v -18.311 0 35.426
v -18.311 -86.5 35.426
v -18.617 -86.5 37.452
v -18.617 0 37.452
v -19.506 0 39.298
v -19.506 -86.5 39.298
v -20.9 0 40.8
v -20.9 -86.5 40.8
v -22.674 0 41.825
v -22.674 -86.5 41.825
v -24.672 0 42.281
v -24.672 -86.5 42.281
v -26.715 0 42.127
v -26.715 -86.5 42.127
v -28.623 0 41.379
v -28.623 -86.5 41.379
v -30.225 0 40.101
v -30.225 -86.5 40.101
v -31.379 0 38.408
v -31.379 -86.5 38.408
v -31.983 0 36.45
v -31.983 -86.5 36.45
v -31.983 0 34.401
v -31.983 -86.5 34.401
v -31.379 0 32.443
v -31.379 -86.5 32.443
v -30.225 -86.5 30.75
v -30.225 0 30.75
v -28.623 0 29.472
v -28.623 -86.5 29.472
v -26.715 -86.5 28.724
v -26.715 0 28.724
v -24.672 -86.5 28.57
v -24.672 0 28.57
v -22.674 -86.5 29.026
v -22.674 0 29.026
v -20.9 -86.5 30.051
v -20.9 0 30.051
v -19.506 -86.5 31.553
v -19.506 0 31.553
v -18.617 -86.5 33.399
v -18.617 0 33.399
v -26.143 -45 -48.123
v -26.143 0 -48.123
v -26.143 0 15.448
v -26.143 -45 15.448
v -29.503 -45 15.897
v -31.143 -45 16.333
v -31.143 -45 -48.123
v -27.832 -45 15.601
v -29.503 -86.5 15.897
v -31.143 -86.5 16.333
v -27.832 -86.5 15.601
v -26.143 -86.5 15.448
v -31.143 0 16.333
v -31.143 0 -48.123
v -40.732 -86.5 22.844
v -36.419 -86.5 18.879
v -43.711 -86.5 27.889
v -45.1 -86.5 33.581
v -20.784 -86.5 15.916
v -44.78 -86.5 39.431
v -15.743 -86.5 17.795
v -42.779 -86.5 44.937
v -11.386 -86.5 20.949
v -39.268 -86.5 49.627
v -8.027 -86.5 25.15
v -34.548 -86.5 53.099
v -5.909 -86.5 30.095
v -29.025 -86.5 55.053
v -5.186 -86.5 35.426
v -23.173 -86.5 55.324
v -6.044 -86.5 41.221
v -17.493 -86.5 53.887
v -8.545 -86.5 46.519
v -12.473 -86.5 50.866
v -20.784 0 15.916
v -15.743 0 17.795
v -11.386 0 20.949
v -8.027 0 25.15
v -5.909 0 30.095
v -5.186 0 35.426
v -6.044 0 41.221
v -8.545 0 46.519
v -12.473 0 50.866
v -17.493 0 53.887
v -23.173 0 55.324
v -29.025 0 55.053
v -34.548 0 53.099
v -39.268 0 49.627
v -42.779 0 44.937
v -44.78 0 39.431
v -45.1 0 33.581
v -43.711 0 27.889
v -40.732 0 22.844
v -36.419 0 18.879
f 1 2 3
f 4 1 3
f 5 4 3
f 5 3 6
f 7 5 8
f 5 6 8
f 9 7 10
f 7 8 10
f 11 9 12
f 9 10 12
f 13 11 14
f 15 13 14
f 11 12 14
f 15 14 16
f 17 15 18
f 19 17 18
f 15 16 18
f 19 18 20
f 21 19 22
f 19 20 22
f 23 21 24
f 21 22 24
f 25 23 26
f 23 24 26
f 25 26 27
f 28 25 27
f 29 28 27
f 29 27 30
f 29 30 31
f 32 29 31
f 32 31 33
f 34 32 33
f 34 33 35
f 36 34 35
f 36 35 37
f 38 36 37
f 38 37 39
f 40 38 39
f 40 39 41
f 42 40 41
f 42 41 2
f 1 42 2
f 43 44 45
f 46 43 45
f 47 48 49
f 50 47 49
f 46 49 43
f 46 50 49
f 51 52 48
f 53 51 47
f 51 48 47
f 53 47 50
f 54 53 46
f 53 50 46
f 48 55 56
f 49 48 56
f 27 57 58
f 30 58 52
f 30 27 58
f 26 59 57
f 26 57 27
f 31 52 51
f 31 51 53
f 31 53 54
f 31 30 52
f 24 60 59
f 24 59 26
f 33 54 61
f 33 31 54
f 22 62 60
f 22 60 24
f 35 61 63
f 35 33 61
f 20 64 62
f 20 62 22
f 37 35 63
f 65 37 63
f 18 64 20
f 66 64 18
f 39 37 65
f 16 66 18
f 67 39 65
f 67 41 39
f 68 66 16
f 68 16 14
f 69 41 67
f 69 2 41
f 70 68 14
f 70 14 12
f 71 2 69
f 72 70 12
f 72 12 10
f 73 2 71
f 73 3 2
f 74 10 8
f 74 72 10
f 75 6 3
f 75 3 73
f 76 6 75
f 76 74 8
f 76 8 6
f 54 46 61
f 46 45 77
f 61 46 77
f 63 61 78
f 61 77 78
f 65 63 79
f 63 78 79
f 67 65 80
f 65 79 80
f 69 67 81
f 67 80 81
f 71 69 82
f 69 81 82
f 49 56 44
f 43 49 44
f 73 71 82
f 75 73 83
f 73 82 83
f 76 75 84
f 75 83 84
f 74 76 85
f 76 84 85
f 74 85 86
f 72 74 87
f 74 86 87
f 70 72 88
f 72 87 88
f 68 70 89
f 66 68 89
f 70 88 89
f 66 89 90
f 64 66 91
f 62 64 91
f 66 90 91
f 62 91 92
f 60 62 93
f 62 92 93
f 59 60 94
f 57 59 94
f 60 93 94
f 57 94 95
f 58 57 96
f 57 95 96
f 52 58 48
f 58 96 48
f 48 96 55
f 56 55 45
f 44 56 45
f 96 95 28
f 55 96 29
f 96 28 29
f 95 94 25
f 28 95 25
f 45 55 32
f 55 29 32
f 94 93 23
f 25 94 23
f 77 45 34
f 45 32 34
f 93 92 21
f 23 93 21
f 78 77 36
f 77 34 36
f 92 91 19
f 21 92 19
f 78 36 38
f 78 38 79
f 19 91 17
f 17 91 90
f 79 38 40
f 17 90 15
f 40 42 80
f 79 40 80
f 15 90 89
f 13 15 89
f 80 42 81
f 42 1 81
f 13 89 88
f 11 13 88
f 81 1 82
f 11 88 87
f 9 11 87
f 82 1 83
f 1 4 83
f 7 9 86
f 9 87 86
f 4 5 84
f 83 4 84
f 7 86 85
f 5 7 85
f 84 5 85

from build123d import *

# Parameters (mm, degrees)
F1_DEPTH = 86.5
F2_DEPTH = 45
F3_R     = 6.874276
F4_DEPTH = 100


with BuildPart() as f1:
    # F0 (on Front) → F1 (new body)
    with BuildSketch(Plane.XZ):
        with BuildLine():
            ThreePointArc((-26.142528, 15.448414), (-11.385953, 20.949011), (-5.185627, 35.42551))
            ThreePointArc((-5.185627, 35.42551), (-37.035985, 51.536655), (-31.142528, 16.333225))
            ThreePointArc((-31.142528, 16.333225), (-28.670722, 15.731498), (-26.142528, 15.448414))
        make_face()
    extrude(amount=F1_DEPTH)

    # F0 (on Front) → F2 (join)
    with BuildSketch(Plane.XZ):
        with BuildLine():
            ThreePointArc((-26.142528, 15.448414), (-28.670722, 15.731498), (-31.142528, 16.333225))
            Line((-31.142528, 16.333225), (-31.142528, -48.122729))
            Line((-31.142528, -48.122729), (-26.142528, -48.122729))
            Line((-26.142528, -48.122729), (-26.142528, 15.448414))
        make_face()
    extrude(amount=F2_DEPTH)

    # F3 (on face) → F4 (cut)
    with BuildSketch(Plane.XZ.offset(86.5)):
        with Locations((-25.185627, 35.42551)):
            Circle(F3_R)
    extrude(amount=-F4_DEPTH, mode=Mode.SUBTRACT)


solid = f1.part
